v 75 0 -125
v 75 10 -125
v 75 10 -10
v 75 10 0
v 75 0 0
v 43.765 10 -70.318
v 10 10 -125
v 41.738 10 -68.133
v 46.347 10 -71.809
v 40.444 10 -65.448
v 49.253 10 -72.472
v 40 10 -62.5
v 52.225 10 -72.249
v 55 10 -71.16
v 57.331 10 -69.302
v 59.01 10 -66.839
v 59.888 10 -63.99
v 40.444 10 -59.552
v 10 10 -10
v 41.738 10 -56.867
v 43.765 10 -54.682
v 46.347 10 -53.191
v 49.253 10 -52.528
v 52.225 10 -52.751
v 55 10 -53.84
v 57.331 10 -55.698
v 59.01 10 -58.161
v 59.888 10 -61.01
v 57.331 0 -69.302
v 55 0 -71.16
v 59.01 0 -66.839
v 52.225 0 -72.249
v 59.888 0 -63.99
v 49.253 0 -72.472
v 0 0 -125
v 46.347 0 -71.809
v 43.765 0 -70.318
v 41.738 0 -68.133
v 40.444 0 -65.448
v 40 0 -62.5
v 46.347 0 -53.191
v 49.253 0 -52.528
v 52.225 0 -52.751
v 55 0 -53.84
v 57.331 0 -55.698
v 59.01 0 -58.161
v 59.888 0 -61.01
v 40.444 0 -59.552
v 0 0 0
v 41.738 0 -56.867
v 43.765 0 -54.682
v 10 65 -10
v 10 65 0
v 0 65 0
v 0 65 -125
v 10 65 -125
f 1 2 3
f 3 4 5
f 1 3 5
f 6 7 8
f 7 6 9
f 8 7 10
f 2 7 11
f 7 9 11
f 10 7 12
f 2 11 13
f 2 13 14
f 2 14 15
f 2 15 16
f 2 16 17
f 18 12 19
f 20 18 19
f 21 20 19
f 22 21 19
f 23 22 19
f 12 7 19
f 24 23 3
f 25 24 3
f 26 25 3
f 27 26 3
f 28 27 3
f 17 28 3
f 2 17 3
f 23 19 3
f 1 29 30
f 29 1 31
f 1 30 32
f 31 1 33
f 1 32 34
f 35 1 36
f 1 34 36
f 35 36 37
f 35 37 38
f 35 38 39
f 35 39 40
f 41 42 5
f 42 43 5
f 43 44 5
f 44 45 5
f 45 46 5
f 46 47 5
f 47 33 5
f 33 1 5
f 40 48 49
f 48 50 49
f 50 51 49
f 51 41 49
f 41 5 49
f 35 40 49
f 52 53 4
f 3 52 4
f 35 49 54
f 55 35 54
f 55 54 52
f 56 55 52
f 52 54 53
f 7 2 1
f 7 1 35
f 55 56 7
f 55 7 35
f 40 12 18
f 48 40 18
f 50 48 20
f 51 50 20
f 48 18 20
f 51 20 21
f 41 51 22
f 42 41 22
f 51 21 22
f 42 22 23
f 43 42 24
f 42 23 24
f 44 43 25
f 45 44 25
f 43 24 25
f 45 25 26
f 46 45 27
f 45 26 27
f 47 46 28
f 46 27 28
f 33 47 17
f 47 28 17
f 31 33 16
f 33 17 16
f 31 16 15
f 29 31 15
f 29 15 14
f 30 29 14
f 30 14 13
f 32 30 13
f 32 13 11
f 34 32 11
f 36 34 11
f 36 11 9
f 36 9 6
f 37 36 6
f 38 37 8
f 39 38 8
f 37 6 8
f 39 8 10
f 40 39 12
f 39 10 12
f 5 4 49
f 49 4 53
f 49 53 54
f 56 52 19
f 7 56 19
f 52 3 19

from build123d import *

# Parameters (mm, degrees)
DODANIE_WYCI_GNI_CIE1_DEPTH = 125
DODANIE_WYCI_GNI_CIE3_DEPTH = 10
SZKIC4_R                    = 10
WYTNIJ_WYCI_GNI_CIE1_DEPTH  = 10


with BuildPart() as part:
    # Szkic2 → Dodanie-wyciągnięcie1 (new body)
    with BuildSketch(Plane.XY):
        Polygon((0, 0), (0, 65), (10, 65), (10, 10), (75, 10), (75, 0), align=None)
    extrude(amount=-DODANIE_WYCI_GNI_CIE1_DEPTH)

    # Szkic3 → Dodanie-wyciągnięcie3 (add)
    with BuildSketch(Plane.XY):
        Polygon((10, 65), (75, 10), (10, 10), align=None)
    extrude(amount=-DODANIE_WYCI_GNI_CIE3_DEPTH)

    # Szkic4 → Wytnij-wyciągnięcie1 (cut)
    with BuildSketch(Plane(origin=(0, 10, 0), x_dir=(1, 0, 0), z_dir=(0, 1, 0))):
        with Locations(Location((50, 62.5, 0), (0, 0, 180))):
            Circle(SZKIC4_R)
    extrude(amount=-WYTNIJ_WYCI_GNI_CIE1_DEPTH, mode=Mode.SUBTRACT)


solid = part.part
